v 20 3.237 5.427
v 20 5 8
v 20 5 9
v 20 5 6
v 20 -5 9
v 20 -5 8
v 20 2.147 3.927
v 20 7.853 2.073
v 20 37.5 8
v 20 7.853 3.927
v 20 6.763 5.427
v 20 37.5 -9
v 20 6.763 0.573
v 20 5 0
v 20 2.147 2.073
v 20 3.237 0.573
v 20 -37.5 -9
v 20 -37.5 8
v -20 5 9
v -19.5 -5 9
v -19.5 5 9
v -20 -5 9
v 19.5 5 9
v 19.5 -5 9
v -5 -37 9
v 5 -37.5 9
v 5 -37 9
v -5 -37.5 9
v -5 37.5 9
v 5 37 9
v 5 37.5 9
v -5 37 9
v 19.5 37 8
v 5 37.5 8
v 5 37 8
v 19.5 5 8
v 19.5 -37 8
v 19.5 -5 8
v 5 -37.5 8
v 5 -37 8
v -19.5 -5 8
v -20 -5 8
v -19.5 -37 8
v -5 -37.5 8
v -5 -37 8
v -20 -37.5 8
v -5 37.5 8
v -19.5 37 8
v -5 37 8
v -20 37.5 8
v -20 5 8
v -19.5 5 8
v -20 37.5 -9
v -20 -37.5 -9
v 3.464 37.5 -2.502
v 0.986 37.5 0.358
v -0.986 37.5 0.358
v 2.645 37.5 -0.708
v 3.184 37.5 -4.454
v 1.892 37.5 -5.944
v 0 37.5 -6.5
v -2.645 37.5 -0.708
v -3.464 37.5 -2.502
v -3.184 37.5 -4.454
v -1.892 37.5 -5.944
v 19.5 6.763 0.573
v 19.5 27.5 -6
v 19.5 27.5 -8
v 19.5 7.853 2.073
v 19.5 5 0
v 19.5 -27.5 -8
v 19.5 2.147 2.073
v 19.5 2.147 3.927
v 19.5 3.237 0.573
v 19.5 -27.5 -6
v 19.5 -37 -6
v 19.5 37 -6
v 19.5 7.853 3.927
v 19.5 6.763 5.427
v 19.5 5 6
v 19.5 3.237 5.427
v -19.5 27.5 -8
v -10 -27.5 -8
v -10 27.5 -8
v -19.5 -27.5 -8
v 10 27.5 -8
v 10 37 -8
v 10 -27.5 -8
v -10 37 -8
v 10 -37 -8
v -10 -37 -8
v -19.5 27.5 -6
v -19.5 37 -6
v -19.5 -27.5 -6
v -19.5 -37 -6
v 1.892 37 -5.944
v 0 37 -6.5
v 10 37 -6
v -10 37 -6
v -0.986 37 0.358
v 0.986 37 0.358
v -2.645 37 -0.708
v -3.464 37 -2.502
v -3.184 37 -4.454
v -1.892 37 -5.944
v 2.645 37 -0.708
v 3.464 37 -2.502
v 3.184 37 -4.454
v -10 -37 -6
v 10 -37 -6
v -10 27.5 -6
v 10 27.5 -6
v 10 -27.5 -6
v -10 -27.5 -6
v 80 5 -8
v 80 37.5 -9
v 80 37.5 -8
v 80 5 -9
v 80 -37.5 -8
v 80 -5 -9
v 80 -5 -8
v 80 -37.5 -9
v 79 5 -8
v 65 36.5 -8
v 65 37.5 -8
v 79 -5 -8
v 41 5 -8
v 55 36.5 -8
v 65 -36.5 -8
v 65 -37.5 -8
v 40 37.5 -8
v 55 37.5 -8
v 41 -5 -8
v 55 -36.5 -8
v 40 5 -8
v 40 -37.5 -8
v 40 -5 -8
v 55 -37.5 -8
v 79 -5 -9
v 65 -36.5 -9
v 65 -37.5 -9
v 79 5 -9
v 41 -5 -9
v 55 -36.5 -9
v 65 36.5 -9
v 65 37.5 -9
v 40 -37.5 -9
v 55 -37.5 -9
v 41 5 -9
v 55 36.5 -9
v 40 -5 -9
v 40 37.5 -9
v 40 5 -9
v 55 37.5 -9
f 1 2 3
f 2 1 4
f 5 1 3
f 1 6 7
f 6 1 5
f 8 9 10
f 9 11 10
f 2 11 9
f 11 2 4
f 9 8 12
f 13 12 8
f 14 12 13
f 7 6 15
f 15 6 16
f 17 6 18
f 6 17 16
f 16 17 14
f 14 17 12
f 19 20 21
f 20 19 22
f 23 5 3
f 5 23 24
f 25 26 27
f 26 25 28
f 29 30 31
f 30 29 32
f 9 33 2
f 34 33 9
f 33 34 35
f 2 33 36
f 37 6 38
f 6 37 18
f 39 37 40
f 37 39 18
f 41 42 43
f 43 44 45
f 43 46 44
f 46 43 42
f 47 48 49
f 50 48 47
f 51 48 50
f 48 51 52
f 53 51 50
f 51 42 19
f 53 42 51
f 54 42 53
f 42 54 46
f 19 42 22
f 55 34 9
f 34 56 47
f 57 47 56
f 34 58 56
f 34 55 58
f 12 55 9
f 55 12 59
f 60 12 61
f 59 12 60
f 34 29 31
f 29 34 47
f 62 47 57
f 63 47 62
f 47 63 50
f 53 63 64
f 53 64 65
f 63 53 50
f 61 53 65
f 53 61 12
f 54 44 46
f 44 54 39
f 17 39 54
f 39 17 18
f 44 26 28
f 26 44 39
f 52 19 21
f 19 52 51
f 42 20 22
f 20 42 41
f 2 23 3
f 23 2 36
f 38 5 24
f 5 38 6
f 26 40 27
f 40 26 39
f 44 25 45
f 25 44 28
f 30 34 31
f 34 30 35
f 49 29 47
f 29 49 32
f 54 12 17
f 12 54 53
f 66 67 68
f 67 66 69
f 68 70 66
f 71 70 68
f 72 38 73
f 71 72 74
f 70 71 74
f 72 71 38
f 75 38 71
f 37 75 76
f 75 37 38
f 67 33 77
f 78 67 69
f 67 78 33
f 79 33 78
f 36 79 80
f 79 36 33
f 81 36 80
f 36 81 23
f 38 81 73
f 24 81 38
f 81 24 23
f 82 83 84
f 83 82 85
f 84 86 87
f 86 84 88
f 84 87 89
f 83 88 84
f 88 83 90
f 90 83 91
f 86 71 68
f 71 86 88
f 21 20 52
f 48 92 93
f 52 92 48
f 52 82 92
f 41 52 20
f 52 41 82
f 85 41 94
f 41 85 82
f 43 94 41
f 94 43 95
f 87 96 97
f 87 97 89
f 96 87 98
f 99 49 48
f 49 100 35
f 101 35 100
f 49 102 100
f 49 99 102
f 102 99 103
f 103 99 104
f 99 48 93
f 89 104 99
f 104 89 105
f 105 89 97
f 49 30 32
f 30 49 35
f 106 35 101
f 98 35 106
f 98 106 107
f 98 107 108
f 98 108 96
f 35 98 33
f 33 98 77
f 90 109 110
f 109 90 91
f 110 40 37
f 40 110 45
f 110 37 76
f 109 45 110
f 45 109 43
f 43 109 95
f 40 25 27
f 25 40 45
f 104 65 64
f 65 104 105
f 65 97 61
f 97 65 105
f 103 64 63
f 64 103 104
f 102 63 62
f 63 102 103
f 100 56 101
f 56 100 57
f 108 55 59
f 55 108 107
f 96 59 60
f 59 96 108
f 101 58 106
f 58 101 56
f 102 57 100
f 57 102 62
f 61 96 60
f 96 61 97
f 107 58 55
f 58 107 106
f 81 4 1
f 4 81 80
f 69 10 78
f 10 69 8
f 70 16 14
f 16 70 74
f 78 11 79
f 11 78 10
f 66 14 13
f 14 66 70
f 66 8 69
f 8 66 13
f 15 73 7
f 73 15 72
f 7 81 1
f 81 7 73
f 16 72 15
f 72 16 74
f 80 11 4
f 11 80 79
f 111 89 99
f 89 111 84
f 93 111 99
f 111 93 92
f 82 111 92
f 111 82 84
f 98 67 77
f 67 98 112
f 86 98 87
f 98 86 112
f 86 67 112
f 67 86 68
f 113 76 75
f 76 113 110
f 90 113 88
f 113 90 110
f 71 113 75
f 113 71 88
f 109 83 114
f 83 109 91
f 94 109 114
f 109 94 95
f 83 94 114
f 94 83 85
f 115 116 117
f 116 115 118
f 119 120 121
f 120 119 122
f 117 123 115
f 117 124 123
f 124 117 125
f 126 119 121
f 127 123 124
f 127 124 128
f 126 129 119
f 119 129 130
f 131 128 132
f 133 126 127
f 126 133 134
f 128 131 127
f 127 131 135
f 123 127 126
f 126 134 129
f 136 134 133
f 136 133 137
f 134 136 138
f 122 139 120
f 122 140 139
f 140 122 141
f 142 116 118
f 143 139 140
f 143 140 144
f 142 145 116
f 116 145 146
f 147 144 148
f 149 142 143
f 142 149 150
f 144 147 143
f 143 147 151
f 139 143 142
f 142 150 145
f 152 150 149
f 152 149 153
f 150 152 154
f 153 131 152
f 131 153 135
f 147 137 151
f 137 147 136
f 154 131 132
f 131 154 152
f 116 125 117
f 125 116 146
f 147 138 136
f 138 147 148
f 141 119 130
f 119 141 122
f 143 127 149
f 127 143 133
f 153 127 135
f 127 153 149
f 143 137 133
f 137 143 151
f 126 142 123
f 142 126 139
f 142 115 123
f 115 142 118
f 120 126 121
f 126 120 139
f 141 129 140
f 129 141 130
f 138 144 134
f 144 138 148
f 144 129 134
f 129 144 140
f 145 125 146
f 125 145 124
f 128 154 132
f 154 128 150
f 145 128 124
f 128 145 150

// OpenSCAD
box = [40,75,18];
walls = 1;
union() {
	difference() {
		cube(box,center=true);
		translate([0,0,walls]) cube([box[0]-walls,box[1]-walls,box[2]],center=true);
		translate([0,box[1]/2-walls,-3])rotate([0,90,90])cylinder(r=3.5,h=10);
		translate([box[0]/2-walls,5,3])rotate([0,90,0])cylinder(r=3,h=10);
		translate([0,0,box[2]/2-walls/2]) lid();
	}
	translate([-box[0]/2,box[1]/2-10,-box[2]/2+walls])cube([10,10,2]);
	translate([box[0]/2-10,box[1]/2-10,-box[2]/2+walls])cube([10,10,2]);
	translate([box[0]/2-10,-box[1]/2,-box[2]/2+walls])cube([10,10,2]);
	translate([-box[0]/2,-box[1]/2,-box[2]/2+walls])cube([10,10,2]);
}

translate([box[0]+20,0,-box[2]/2+walls/2]) lid();

module lid() {
	difference() {
		cube([box[0],box[1],walls],center=true);
		translate([-box[0]/2+walls/2,0,0])cube([walls,10,walls],center=true);
		translate([box[0]/2-walls/2,0,0])cube([walls,10,walls],center=true);
		translate([0,-box[1]/2+walls/2,0])cube([10,walls,walls],center=true);
		translate([0,box[1]/2-walls/2,0])cube([10,walls,walls],center=true);
	}
}
